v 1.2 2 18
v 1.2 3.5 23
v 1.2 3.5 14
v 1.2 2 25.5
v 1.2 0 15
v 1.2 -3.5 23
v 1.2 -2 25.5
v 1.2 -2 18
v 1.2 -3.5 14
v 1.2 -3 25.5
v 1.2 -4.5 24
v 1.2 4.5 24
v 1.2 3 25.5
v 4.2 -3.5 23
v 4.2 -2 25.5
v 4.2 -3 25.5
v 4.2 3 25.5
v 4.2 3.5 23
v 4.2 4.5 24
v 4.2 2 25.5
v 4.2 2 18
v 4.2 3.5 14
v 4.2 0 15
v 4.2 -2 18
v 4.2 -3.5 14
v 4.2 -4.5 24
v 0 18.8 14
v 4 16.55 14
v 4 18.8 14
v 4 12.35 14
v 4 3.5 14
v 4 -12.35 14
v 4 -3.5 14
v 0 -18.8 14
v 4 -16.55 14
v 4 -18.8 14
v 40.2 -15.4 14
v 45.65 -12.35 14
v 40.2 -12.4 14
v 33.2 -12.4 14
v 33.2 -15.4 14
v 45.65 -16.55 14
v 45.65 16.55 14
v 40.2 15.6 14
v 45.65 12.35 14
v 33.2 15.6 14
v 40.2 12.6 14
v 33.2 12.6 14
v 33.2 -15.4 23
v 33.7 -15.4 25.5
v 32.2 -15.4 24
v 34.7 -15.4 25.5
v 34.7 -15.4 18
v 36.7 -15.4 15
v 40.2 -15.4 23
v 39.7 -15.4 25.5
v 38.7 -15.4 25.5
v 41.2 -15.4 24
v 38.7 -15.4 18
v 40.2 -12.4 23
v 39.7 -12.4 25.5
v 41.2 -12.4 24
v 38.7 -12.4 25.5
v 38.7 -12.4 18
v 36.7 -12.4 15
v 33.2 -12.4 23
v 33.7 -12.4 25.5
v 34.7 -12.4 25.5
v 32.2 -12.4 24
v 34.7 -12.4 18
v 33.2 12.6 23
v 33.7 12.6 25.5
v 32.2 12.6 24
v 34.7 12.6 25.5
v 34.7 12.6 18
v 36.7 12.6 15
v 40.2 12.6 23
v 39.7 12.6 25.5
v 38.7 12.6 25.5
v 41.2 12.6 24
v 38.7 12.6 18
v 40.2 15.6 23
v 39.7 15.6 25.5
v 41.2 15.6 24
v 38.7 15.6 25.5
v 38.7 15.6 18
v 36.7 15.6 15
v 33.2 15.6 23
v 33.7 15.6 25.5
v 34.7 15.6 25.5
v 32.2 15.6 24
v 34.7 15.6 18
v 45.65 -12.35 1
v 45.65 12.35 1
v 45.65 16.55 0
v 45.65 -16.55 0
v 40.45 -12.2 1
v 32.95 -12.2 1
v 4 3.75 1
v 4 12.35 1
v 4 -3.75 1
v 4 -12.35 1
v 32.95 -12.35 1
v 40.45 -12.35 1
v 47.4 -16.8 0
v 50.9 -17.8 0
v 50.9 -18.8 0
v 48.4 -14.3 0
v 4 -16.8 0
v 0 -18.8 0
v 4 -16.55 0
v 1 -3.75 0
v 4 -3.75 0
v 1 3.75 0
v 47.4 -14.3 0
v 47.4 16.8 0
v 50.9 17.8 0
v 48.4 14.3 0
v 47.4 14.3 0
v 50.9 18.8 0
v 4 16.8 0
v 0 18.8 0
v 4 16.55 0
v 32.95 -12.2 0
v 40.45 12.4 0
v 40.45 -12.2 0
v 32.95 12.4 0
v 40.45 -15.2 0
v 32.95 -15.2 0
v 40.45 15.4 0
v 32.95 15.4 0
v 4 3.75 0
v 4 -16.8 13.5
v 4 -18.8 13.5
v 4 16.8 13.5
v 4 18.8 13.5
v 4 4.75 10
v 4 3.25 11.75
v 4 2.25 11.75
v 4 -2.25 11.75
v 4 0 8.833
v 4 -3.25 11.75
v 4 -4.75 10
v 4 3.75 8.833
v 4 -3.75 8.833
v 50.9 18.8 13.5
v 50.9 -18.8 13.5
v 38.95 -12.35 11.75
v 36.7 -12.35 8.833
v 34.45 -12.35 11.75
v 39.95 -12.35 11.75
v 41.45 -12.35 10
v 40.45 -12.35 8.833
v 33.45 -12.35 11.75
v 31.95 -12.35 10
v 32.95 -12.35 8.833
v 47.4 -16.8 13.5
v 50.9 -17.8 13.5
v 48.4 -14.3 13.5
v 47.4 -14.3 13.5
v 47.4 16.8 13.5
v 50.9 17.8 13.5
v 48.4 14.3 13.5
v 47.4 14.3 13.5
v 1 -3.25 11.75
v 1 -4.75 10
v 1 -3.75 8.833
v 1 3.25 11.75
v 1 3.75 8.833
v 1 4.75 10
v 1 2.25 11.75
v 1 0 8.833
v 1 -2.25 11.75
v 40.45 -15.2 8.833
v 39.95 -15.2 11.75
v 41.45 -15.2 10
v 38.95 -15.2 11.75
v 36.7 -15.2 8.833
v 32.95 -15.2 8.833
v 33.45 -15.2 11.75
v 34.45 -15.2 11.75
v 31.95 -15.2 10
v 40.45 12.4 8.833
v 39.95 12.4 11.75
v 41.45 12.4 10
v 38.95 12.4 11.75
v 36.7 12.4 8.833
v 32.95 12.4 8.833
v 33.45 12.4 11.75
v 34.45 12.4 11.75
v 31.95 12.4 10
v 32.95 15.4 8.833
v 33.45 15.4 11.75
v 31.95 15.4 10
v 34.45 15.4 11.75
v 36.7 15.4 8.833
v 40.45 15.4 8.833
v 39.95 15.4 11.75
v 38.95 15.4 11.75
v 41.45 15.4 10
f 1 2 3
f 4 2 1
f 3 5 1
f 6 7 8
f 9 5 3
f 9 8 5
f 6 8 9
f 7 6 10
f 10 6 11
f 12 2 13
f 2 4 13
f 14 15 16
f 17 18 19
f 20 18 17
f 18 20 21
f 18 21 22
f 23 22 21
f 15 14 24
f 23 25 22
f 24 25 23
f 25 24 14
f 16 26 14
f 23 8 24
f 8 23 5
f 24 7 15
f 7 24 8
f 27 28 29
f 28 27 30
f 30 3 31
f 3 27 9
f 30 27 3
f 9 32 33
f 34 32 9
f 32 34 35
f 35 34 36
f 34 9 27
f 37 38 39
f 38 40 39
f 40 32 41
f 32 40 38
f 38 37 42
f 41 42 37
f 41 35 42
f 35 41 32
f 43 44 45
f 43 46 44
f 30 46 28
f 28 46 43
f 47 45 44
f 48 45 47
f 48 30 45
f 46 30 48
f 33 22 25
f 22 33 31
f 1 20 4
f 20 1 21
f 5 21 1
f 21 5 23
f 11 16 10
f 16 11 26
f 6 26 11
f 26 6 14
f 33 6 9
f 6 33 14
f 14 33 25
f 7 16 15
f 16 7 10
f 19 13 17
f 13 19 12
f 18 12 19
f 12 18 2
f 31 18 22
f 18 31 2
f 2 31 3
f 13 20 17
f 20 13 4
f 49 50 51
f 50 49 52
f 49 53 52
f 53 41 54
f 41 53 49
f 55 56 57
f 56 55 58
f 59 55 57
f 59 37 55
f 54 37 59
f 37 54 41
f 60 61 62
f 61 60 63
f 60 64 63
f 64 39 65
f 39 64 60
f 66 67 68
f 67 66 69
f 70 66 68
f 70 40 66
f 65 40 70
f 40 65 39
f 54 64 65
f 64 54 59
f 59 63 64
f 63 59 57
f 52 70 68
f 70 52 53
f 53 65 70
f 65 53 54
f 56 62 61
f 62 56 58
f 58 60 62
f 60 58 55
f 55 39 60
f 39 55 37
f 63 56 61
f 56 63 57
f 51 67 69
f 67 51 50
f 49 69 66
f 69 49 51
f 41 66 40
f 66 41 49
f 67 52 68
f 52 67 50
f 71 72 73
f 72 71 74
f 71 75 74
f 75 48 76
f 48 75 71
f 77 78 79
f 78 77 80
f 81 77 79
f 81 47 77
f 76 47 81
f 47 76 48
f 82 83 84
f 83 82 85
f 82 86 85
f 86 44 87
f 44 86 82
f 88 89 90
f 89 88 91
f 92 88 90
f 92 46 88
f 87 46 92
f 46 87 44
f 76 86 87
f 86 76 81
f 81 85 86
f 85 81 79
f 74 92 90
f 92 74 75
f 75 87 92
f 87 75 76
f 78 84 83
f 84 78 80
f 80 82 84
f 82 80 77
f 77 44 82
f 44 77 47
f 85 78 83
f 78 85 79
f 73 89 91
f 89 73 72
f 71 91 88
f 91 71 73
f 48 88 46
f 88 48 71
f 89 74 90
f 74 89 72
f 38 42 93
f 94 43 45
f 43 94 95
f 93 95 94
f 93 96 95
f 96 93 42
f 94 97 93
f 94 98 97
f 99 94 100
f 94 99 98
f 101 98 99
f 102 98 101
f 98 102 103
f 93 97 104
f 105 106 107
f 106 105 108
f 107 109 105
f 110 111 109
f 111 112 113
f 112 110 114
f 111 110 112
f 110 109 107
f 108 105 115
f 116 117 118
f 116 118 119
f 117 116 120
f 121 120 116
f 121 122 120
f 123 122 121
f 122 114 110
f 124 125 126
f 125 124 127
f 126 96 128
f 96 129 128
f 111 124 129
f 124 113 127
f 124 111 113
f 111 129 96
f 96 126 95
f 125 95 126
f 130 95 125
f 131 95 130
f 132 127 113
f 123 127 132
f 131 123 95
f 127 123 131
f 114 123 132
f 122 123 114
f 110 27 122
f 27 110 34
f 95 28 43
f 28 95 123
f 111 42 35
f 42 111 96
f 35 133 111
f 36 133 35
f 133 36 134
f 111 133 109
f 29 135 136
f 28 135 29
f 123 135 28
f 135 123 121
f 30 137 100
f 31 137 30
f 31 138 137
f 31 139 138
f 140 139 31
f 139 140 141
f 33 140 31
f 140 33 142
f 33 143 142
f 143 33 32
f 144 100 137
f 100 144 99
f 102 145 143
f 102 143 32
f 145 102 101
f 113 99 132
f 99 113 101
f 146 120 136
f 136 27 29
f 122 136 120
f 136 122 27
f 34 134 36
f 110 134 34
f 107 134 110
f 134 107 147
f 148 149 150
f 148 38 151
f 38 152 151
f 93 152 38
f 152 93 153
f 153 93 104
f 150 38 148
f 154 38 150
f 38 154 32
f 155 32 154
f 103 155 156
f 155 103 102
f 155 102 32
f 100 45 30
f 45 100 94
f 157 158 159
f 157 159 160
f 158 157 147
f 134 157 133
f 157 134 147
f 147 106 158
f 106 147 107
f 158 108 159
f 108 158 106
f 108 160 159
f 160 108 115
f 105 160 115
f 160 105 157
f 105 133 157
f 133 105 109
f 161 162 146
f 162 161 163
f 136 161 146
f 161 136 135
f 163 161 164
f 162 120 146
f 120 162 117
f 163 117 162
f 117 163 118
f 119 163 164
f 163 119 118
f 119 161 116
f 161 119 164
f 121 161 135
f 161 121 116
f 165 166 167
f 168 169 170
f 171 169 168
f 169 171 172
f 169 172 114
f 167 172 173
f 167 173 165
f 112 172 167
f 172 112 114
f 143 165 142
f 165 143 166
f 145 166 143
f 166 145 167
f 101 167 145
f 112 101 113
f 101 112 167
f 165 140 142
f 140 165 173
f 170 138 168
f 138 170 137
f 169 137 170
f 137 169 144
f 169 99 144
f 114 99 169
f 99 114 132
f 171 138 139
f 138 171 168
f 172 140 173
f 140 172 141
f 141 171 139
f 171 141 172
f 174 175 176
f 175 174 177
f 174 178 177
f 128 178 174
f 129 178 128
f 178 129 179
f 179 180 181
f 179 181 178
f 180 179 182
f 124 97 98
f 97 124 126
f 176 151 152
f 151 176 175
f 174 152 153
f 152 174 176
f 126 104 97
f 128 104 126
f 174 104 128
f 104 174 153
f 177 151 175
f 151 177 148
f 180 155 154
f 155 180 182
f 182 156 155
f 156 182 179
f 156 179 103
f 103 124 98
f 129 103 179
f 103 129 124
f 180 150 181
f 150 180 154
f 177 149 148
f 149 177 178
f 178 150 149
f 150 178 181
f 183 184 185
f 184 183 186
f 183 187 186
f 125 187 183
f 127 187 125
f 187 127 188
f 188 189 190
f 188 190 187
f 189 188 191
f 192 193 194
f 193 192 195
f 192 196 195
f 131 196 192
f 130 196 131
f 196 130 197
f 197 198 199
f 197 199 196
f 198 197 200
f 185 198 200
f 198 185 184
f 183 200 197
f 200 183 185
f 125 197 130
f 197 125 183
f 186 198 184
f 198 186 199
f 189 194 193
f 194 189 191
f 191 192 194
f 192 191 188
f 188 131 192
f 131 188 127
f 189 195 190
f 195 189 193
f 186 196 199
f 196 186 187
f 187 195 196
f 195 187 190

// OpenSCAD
//Mangdang Servo Holder
// Version 1
//It's hard to support the clips
//	Version 2
//Make the clip a little easier
//Enlarge the servo clips so it can rest on the back
Dz=3;
Ty=1.5;
LGx=10;
Gy=1.0;
Dy=4;

//SCS0009 dimensions
//X axis
Lx_butt = (16.4+25.0);
Lx_flange_thickness = 1.5;
Lx_body_flange_gearbox = 23.0;
Lx_body_flange_gearbox_axel = 27.3;
//Y axis
Ly_butt = 23.2;
Ly_hole_interaxis = 27.0;
Ly_flange = 32.6;
//Z axis
Lz_depth = 12.5;

Lx_gearbox_thickness = Lx_body_flange_gearbox -Lx_flange_thickness -Lx_butt;

ly_flange_length = (Ly_flange-Ly_butt)/2;


///SCS0009 HOLDER
lx_base_thickness = 4;
ly_wall_thickness = 2;
lz_wall_thickness = 1;
l_margin = 0.5;

//Bax with the origin at the center of its base for easy stacking
module base_box( in_lx, in_ly, in_lz )
{
	translate([0, -in_ly/2, 0])
	{
        cube([in_lx, in_ly, in_lz], center=false);
    }
}

module cube_translate(size_vector, translate_vector)
{
    translate(translate_vector)
    cube(size_vector);
}

module hinge_triangle_up( Dz, Ty, LGx, Gx, Gy )
{
	//Gx hieght of the grip cannot exceed 2*Ty thickness
	//Dz = Z height of the hinge
	//Ty = Thickness of the hinge
	
	//HARDNESS OF THE HINGE
	//Hardness increases with the surface Dz*Ty
	//Hardness decreases with Length LGx
	linear_extrude(Dz)
	polygon
	(
		points=
		[
			//Bottom Left
			[0.0,0.0],
			//Thickenss of the hinge
			[0.0, Ty],
			//Start of the triangular bump
			[LGx -Gx, Ty],
			//Tip of the bump
			[LGx, Ty+Gy],
			//Tip of the hinge
			[LGx+1.5*Gx, Ty -0.5*Gy],
			//Tip base of the hinge
			[LGx+1.5*Gx, 0],
		],
		paths=
		[
			[0,1,2,3,4,5]
		],
		convexity=1
	);	
}

module hinge_triangle_down( Dz, Ty, LGx, Gx, Gy )
{
	//Flip and keep origin to the base of the long side
	translate([0,0,Dz])
	rotate([0,180,-180])
	hinge_triangle_up(Dz, Ty, LGx, Gx, Gy);
}

module hinge_male(Dz, Ty, LGx, Gy, Dy )
{
	//
	Gx = Dy/4;

	linear_extrude(Dz)
	polygon
	(
		points=
		[
			[0.0, -Dy/2],
			[0.0, Dy/2],
			[Dy, Dy/2],
			[Dy/4, 0],
			[Dy, -Dy/2],

		],
		paths=
		[
			[0,1,2,3,4]
		],
		convexity=1
	);	

	translate([0,Dy/2,0])
	hinge_triangle_up(Dz, Ty, LGx, Gx, Gy);

	translate([0,-Dy/2,0])
	hinge_triangle_down(Dz, Ty, LGx, Gx, Gy);
}

module hinge_female(Dz, Ty, LGx, Gy, Dy )
{
	//Male hinges with additional slack
	y_slack = 0.5;
	//
	Gx = Dy/4+y_slack/3;
	//Conserve the tips
	translate([0,Dy/2+y_slack/2,0])
	hinge_triangle_up(Dz, Ty, LGx, Gx, Gy);
	translate([0,-Dy/2-y_slack/2,0])
	hinge_triangle_down(Dz, Ty, LGx, Gx, Gy);
	//Add a box to cut out the space between hinges
	//translate([0,-Dy/2-y_slack/2,0])
	//cube([LGx+1.5*Gx,Dy+y_slack,Dz]);
	//Subtract a ribbon that leaves a triangle at the end
	linear_extrude(Dz)
	polygon
	(
		points=
		[
			[0.0, -Dy/2-y_slack/2],
			[0.0, Dy/2+y_slack/2],
			[LGx +1.5*Gx, Dy/2+y_slack/2],
			[LGx -1.0*Gx, 0.0],
			[LGx +1.5*Gx, -Dy/2-y_slack/2],
		],
		paths=
		[
			[0,1,2,3,4]
		],
		convexity=1
	);	
}

module servo()
{
	color("black")
	{
		base_box(Lx_butt, Ly_butt, Lz_depth);
		translate([Lx_butt,0,0])
			base_box(Lx_flange_thickness, Ly_flange, Lz_depth);
		translate([Lx_butt+Lx_flange_thickness,0,0])
			base_box(Lx_gearbox_thickness, Ly_butt, Lz_depth);
	}
}

//Attempt to draw the servo using polygon
//it's faster to stack four boxes
module servo_poly()
{
	polygon
	(
		points=
		[
			[0.0,Ly_butt/2],
			[100,0],
			[0,100],

		],
		paths=
		[
			[0,1,2],
			[]
		],
		convexity=100
	);		

}

module long_hinge(in_height, in_length, in_thickness, in_grip, in_reinforce )
{
	linear_extrude(in_height)
	polygon
	(
		points=
		[
			[0.0,0.0],
			[in_thickness,0],
			[in_thickness,in_length+in_grip+in_reinforce],
			[in_thickness/2,in_length+in_grip+in_reinforce],
			[-in_grip,in_length+in_reinforce],
			[-in_grip,in_length],
			[0,in_length],

		],
		paths=
		[
			[0,1,2,3,4,5,6]
		],
		convexity=1
	);	


}

module servo_holder()
{
	//Holes for the wires
	ly_wire = 9;
	lz_wire = 3;

	z_hinge_depth = 3;
	n_hinge_margin = 0.2;

	translate([0,0,0])
	difference()
	{
		union()
		{
			//Bottom Cover
			cube_translate
			(
				[
					lx_base_thickness+Lx_butt+0.5*l_margin,
					Ly_flange+1*l_margin,
					lz_wall_thickness
				],[
					0,
					-Ly_flange/2-l_margin/2,
					0
				]
			);

			//Base of the servo holder
			base_box(lx_base_thickness, Ly_flange+2*ly_wall_thickness+2*l_margin, lz_wall_thickness+Lz_depth+l_margin);

			//Walls
			//translate([lx_base_thickness,-Ly_flange/2-ly_wall_thickness,0])
				//base_box(Lx_body_flange_gearbox_axel-lx_base_thickness, ly_wall_thickness, Lz_depth);

			//Top Hinge
			//translate([lx_base_thickness,+Ly_flange/2+ly_wall_thickness,0])
				//base_box(Lx_body_flange_gearbox_axel-lx_base_thickness, ly_wall_thickness, Lz_depth);

			//Servo flange rest
			translate([lx_base_thickness,-Ly_flange/2-l_margin+ly_flange_length/2,lz_wall_thickness])
				base_box(Lx_butt+l_margin/2, ly_flange_length-l_margin, Lz_depth+l_margin);
			translate([lx_base_thickness,+Ly_flange/2+l_margin-ly_flange_length/2,lz_wall_thickness])
				base_box(Lx_butt+l_margin/2, ly_flange_length-l_margin, Lz_depth+l_margin);

			//Servo Hinge
			translate([lx_base_thickness,-Ly_flange/2-ly_wall_thickness/2+l_margin,0*lz_wall_thickness+0*l_margin/2])
			rotate([0,0,-90])
			long_hinge
			(
				Lz_depth+lz_wall_thickness,
				Lx_butt+Lx_flange_thickness+l_margin*1.0,
				ly_wall_thickness,
				2.5,
				1
			);

			//Servo Hinge
			translate([lx_base_thickness,+Ly_flange/2+ly_wall_thickness/2-l_margin,1*lz_wall_thickness+Lz_depth+0*l_margin/2])
			rotate([0,-180,-90])
			long_hinge
			(
				Lz_depth+lz_wall_thickness,
				Lx_butt+Lx_flange_thickness+l_margin*1.0,
				ly_wall_thickness,
				2.5,
				1
			);

			//Bottom Clip
			translate([1.0+n_hinge_margin,0,lz_wall_thickness+Lz_depth+l_margin])
			rotate([0,-90,180])
			hinge_male(Dz=Dz, Ty=Ty, LGx=LGx, Gy=Gy, Dy=Dy);
			
			//Minus Clip
			translate([lz_wall_thickness+Lx_butt/2+15,-Ly_flange/2+l_margin/2+ly_flange_length/2-z_hinge_depth/2-n_hinge_margin,lz_wall_thickness+Lz_depth+l_margin])
			rotate([90,-90,180])
			hinge_male(Dz=Dz, Ty=Ty, LGx=LGx, Gy=Gy, Dy=Dy);
			
			//Plus Clip
			translate([lz_wall_thickness+Lx_butt/2+15,Ly_flange/2-l_margin/2-ly_flange_length/2-z_hinge_depth/2+2*n_hinge_margin,lz_wall_thickness+Lz_depth+l_margin])
			rotate([90,-90,180])
			hinge_male(Dz=Dz, Ty=Ty, LGx=LGx, Gy=Gy, Dy=Dy);
		};	//End Union
		//Holes for servo wires
		//translate([0, Ly_butt/2-ly_wire/2+l_margin, Lz_depth/2-lz_wire/2])
			//base_box(lx_base_thickness,ly_wire,lz_wire);
		//translate([0, -Ly_butt/2+ly_wire/2-l_margin, Lz_depth/2-lz_wire/2])
			//base_box(lx_base_thickness,ly_wire,lz_wire);

		//Mating Bottom Clip
		translate([1,0,0])
		rotate([0,-90,180])
		hinge_female(Dz=Dz, Ty=Ty, LGx=LGx, Gy=Gy, Dy=Dy);

		//Mating Minus Clip
		translate([lz_wall_thickness+Lx_butt/2+15,-Ly_flange/2+l_margin/2+ly_flange_length/2-z_hinge_depth/2,0])
		rotate([90,-90,180])
		hinge_female(Dz=Dz, Ty=Ty, LGx=LGx, Gy=Gy, Dy=Dy);

		//Mating Plus Clip
		translate([lz_wall_thickness+Lx_butt/2+15,Ly_flange/2-l_margin/2-ly_flange_length/2-z_hinge_depth/2+n_hinge_margin,0])
		rotate([90,-90,180])
		hinge_female(Dz=Dz, Ty=Ty, LGx=LGx, Gy=Gy, Dy=Dy);

	}

	

}

servo_holder();

//translate([lx_base_thickness+l_margin,0,lz_wall_thickness+l_margin/2])
//servo();

//base_box(10, 20, 30);
